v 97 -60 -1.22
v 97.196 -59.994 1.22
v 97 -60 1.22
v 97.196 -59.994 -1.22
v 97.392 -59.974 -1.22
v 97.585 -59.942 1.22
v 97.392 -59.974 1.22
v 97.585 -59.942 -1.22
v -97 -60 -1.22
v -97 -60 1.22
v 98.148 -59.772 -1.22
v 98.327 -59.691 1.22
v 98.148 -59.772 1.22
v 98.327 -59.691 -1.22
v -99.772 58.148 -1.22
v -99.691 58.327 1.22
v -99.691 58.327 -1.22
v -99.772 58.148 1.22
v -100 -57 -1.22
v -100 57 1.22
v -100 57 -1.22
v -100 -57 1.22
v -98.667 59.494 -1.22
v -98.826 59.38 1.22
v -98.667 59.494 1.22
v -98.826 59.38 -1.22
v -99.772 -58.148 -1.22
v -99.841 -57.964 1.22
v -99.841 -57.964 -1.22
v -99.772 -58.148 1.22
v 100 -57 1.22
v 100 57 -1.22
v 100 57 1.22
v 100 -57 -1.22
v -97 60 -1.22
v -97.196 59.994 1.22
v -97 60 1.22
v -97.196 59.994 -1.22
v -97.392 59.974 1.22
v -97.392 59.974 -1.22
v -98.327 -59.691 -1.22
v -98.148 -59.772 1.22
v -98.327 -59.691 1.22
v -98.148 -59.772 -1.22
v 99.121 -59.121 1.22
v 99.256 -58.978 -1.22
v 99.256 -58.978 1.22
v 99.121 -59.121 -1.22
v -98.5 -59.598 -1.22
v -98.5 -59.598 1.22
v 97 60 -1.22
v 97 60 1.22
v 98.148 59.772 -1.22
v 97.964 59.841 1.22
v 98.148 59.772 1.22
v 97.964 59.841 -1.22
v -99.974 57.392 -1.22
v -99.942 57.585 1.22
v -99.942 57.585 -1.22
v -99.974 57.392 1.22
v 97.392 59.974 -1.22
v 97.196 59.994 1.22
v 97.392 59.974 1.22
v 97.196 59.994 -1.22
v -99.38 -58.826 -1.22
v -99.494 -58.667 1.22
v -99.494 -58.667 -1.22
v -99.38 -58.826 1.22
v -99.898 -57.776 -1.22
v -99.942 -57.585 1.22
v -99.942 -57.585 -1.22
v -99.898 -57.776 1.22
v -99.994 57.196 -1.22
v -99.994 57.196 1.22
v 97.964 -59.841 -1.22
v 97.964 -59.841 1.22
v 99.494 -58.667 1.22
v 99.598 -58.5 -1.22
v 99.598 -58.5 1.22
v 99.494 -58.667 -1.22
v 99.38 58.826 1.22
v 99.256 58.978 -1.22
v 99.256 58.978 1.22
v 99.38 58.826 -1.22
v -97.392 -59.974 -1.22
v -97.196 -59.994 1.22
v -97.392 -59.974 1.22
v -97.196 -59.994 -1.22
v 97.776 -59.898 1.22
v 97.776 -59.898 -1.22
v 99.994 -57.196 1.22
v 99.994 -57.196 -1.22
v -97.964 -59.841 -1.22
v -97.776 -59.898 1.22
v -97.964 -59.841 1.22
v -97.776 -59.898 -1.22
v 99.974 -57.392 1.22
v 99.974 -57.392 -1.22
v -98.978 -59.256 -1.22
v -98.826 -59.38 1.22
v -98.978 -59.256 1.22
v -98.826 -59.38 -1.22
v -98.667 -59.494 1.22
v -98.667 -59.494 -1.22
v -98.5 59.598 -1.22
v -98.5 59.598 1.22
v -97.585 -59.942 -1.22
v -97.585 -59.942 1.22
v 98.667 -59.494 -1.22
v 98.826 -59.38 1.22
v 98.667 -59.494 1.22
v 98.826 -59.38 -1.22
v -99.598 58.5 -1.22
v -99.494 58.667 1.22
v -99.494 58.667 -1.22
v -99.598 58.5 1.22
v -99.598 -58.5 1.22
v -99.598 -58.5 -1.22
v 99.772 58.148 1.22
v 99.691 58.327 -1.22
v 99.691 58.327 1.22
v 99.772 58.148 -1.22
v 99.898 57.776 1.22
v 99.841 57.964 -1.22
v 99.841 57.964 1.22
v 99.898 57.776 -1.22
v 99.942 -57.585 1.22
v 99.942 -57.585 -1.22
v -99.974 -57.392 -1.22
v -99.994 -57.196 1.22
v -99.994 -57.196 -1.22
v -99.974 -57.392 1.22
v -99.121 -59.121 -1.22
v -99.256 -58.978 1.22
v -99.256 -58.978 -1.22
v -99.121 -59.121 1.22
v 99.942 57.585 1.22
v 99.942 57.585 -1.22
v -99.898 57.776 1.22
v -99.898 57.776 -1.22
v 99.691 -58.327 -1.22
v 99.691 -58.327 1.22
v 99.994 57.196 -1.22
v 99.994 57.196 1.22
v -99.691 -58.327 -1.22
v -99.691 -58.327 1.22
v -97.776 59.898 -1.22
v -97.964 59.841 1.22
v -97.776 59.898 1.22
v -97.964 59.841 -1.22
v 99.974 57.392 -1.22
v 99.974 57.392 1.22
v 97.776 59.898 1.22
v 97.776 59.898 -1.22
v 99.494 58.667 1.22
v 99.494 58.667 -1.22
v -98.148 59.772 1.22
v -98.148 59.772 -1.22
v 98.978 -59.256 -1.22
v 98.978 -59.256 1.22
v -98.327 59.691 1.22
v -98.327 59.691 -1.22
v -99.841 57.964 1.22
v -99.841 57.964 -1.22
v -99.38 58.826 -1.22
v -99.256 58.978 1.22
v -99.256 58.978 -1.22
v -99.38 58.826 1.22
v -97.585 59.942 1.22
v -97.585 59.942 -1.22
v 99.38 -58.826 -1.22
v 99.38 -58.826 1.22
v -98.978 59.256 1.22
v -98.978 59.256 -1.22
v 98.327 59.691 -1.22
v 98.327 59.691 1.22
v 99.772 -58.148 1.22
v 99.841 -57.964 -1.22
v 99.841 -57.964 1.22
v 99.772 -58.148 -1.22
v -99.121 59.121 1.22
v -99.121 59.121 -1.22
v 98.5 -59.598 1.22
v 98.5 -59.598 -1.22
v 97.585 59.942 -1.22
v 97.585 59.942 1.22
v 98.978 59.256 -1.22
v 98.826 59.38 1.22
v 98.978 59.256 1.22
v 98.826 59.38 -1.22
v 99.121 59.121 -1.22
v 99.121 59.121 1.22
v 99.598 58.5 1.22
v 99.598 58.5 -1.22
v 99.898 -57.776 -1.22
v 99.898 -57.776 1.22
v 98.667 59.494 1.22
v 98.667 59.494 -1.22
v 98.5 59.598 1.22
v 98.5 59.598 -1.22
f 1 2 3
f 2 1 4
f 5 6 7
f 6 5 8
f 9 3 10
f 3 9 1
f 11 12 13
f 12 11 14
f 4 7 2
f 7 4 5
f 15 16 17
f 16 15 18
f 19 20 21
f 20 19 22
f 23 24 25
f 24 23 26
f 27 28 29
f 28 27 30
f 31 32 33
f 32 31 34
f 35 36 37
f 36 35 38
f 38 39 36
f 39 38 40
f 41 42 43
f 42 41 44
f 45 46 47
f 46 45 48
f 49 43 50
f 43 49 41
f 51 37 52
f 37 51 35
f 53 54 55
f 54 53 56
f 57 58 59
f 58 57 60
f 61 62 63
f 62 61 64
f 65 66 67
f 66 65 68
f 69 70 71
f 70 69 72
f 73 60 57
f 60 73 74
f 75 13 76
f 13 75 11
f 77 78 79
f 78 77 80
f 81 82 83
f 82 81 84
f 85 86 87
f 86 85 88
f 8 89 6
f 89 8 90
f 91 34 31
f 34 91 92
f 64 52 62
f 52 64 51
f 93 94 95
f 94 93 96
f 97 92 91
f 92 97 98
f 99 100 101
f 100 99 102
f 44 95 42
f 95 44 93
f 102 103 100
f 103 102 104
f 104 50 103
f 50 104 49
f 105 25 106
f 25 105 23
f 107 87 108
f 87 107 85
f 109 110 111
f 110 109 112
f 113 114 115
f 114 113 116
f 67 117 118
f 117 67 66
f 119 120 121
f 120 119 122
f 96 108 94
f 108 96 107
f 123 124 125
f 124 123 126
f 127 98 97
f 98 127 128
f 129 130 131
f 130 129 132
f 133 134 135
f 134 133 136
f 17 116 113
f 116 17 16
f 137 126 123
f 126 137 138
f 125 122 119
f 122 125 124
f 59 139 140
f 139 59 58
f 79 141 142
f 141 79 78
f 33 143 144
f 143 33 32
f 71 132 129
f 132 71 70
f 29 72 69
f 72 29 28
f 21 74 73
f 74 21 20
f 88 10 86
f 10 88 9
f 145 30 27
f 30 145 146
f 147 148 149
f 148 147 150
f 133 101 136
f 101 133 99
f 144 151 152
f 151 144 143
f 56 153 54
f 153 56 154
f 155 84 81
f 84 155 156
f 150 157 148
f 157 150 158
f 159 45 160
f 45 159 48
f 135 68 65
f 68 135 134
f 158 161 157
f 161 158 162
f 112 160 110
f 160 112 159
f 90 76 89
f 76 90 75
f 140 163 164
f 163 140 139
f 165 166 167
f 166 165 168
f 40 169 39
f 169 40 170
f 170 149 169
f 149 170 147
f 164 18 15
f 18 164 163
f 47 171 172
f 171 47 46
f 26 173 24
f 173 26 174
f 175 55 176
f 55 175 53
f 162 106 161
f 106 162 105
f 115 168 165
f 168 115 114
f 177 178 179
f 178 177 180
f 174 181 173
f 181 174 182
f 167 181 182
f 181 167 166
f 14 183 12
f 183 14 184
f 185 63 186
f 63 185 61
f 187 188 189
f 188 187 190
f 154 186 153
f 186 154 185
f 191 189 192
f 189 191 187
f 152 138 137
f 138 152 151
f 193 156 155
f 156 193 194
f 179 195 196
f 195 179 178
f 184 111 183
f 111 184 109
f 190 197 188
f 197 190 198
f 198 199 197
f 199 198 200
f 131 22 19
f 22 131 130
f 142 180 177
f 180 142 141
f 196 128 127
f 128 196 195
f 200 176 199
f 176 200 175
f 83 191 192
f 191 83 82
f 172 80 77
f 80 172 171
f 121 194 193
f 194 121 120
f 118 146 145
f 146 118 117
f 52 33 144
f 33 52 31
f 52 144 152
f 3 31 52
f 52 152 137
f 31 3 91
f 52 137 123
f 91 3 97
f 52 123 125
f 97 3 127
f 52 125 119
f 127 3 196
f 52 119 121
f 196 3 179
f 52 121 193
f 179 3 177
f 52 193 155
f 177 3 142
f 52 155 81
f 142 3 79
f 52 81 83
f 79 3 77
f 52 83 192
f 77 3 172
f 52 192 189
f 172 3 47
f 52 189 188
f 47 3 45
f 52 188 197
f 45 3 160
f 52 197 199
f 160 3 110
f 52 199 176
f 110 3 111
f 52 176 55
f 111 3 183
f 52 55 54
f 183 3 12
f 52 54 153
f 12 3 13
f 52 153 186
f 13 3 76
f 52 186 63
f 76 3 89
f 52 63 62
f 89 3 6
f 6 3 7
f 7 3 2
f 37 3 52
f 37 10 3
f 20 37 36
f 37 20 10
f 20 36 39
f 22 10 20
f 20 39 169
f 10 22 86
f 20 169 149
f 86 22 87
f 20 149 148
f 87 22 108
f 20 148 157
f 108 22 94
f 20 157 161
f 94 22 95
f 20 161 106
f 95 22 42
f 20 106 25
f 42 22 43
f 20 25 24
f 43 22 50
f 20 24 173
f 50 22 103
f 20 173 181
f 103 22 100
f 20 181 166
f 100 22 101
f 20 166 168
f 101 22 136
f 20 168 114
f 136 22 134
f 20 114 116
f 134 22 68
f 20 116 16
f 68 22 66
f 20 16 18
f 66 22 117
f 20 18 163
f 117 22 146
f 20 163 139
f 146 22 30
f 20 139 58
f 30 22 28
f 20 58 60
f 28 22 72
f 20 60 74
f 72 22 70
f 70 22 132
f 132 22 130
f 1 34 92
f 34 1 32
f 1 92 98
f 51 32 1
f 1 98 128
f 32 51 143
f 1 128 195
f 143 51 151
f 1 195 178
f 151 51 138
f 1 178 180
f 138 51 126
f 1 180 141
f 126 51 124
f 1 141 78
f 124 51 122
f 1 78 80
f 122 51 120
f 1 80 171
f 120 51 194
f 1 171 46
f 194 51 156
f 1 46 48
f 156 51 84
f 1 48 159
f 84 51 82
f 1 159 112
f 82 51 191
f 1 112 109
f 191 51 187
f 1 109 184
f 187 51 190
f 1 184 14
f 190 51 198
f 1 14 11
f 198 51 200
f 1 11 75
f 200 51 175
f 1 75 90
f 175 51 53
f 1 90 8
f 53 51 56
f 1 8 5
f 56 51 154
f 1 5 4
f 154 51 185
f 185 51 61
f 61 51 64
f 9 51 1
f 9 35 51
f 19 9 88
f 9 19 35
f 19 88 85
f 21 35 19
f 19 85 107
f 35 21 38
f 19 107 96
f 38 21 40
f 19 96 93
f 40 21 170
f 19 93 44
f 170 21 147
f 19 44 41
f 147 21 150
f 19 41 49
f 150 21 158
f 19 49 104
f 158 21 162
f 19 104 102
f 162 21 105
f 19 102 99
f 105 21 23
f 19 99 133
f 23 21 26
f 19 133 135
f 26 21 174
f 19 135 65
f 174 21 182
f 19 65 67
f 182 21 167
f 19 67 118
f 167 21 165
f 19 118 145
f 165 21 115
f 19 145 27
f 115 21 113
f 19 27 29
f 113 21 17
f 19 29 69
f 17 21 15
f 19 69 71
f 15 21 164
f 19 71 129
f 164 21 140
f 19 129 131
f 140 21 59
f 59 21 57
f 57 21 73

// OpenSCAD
$fn = 96;

// Sheet dimensions (mm)
length = 200;
width  = 120;
thickness = 2;

// Corner radius
corner_radius = 3;

// Carbon weave relief (make it read clearly)
weave_amp   = 0.28;   // raised height
weave_pitch = 5.0;    // spacing between strands
weave_w     = 1.8;    // strand width
weave_overlap = 0.06; // overlap into base to guarantee one connected solid

module rounded_sheet(l, w, t, r){
    r2 = min(r, l/2, w/2);
    linear_extrude(height=t, convexity=10)
        offset(r=r2)
            square([l - 2*r2, w - 2*r2], center=true);
}

module rounded_mask_2d(l, w, r){
    r2 = min(r, l/2, w/2);
    offset(r=r2)
        square([l - 2*r2, w - 2*r2], center=true);
}

module weave_relief(l, w, amp, pitch, strand_w, r){
    module mask2d() rounded_mask_2d(l, w, r);

    // Build a true "basket weave" look by combining two stripe families
    // and adding a slight phase offset so it doesn't read as a single diagonal.
    module stripes2d(angle, phase){
        span = max(l, w) * 4;
        n = ceil(span / pitch) + 4;
        union(){
            for (i = [-n:n]){
                translate([i*pitch + phase, 0])
                    rotate(angle)
                        square([strand_w, span], center=true);
            }
        }
    }

    module weave2d(){
        union(){
            stripes2d( 45, 0);
            stripes2d(-45, pitch/2);
            // Add a second, thinner set to suggest alternating tow bundles
            stripes2d( 45, pitch/2);
            stripes2d(-45, 0);
        }
    }

    linear_extrude(height=amp, convexity=10)
        intersection(){
            mask2d();
            weave2d();
        }
}

// One connected solid: base + top relief + bottom relief, all overlapping into base
color([0.07, 0.07, 0.08])
union(){
    // Base sheet centered at Z=0 for consistent views
    translate([0, 0, -thickness/2])
        rounded_sheet(length, width, thickness, corner_radius);

    // Top weave: sits on top surface and overlaps into base
    translate([0, 0, thickness/2 - weave_overlap])
        weave_relief(length, width, weave_amp, weave_pitch, weave_w, corner_radius);

    // Bottom weave: sits on bottom surface and overlaps into base
    translate([0, 0, -thickness/2 - weave_amp + weave_overlap])
        weave_relief(length, width, weave_amp, weave_pitch, weave_w, corner_radius);
}
